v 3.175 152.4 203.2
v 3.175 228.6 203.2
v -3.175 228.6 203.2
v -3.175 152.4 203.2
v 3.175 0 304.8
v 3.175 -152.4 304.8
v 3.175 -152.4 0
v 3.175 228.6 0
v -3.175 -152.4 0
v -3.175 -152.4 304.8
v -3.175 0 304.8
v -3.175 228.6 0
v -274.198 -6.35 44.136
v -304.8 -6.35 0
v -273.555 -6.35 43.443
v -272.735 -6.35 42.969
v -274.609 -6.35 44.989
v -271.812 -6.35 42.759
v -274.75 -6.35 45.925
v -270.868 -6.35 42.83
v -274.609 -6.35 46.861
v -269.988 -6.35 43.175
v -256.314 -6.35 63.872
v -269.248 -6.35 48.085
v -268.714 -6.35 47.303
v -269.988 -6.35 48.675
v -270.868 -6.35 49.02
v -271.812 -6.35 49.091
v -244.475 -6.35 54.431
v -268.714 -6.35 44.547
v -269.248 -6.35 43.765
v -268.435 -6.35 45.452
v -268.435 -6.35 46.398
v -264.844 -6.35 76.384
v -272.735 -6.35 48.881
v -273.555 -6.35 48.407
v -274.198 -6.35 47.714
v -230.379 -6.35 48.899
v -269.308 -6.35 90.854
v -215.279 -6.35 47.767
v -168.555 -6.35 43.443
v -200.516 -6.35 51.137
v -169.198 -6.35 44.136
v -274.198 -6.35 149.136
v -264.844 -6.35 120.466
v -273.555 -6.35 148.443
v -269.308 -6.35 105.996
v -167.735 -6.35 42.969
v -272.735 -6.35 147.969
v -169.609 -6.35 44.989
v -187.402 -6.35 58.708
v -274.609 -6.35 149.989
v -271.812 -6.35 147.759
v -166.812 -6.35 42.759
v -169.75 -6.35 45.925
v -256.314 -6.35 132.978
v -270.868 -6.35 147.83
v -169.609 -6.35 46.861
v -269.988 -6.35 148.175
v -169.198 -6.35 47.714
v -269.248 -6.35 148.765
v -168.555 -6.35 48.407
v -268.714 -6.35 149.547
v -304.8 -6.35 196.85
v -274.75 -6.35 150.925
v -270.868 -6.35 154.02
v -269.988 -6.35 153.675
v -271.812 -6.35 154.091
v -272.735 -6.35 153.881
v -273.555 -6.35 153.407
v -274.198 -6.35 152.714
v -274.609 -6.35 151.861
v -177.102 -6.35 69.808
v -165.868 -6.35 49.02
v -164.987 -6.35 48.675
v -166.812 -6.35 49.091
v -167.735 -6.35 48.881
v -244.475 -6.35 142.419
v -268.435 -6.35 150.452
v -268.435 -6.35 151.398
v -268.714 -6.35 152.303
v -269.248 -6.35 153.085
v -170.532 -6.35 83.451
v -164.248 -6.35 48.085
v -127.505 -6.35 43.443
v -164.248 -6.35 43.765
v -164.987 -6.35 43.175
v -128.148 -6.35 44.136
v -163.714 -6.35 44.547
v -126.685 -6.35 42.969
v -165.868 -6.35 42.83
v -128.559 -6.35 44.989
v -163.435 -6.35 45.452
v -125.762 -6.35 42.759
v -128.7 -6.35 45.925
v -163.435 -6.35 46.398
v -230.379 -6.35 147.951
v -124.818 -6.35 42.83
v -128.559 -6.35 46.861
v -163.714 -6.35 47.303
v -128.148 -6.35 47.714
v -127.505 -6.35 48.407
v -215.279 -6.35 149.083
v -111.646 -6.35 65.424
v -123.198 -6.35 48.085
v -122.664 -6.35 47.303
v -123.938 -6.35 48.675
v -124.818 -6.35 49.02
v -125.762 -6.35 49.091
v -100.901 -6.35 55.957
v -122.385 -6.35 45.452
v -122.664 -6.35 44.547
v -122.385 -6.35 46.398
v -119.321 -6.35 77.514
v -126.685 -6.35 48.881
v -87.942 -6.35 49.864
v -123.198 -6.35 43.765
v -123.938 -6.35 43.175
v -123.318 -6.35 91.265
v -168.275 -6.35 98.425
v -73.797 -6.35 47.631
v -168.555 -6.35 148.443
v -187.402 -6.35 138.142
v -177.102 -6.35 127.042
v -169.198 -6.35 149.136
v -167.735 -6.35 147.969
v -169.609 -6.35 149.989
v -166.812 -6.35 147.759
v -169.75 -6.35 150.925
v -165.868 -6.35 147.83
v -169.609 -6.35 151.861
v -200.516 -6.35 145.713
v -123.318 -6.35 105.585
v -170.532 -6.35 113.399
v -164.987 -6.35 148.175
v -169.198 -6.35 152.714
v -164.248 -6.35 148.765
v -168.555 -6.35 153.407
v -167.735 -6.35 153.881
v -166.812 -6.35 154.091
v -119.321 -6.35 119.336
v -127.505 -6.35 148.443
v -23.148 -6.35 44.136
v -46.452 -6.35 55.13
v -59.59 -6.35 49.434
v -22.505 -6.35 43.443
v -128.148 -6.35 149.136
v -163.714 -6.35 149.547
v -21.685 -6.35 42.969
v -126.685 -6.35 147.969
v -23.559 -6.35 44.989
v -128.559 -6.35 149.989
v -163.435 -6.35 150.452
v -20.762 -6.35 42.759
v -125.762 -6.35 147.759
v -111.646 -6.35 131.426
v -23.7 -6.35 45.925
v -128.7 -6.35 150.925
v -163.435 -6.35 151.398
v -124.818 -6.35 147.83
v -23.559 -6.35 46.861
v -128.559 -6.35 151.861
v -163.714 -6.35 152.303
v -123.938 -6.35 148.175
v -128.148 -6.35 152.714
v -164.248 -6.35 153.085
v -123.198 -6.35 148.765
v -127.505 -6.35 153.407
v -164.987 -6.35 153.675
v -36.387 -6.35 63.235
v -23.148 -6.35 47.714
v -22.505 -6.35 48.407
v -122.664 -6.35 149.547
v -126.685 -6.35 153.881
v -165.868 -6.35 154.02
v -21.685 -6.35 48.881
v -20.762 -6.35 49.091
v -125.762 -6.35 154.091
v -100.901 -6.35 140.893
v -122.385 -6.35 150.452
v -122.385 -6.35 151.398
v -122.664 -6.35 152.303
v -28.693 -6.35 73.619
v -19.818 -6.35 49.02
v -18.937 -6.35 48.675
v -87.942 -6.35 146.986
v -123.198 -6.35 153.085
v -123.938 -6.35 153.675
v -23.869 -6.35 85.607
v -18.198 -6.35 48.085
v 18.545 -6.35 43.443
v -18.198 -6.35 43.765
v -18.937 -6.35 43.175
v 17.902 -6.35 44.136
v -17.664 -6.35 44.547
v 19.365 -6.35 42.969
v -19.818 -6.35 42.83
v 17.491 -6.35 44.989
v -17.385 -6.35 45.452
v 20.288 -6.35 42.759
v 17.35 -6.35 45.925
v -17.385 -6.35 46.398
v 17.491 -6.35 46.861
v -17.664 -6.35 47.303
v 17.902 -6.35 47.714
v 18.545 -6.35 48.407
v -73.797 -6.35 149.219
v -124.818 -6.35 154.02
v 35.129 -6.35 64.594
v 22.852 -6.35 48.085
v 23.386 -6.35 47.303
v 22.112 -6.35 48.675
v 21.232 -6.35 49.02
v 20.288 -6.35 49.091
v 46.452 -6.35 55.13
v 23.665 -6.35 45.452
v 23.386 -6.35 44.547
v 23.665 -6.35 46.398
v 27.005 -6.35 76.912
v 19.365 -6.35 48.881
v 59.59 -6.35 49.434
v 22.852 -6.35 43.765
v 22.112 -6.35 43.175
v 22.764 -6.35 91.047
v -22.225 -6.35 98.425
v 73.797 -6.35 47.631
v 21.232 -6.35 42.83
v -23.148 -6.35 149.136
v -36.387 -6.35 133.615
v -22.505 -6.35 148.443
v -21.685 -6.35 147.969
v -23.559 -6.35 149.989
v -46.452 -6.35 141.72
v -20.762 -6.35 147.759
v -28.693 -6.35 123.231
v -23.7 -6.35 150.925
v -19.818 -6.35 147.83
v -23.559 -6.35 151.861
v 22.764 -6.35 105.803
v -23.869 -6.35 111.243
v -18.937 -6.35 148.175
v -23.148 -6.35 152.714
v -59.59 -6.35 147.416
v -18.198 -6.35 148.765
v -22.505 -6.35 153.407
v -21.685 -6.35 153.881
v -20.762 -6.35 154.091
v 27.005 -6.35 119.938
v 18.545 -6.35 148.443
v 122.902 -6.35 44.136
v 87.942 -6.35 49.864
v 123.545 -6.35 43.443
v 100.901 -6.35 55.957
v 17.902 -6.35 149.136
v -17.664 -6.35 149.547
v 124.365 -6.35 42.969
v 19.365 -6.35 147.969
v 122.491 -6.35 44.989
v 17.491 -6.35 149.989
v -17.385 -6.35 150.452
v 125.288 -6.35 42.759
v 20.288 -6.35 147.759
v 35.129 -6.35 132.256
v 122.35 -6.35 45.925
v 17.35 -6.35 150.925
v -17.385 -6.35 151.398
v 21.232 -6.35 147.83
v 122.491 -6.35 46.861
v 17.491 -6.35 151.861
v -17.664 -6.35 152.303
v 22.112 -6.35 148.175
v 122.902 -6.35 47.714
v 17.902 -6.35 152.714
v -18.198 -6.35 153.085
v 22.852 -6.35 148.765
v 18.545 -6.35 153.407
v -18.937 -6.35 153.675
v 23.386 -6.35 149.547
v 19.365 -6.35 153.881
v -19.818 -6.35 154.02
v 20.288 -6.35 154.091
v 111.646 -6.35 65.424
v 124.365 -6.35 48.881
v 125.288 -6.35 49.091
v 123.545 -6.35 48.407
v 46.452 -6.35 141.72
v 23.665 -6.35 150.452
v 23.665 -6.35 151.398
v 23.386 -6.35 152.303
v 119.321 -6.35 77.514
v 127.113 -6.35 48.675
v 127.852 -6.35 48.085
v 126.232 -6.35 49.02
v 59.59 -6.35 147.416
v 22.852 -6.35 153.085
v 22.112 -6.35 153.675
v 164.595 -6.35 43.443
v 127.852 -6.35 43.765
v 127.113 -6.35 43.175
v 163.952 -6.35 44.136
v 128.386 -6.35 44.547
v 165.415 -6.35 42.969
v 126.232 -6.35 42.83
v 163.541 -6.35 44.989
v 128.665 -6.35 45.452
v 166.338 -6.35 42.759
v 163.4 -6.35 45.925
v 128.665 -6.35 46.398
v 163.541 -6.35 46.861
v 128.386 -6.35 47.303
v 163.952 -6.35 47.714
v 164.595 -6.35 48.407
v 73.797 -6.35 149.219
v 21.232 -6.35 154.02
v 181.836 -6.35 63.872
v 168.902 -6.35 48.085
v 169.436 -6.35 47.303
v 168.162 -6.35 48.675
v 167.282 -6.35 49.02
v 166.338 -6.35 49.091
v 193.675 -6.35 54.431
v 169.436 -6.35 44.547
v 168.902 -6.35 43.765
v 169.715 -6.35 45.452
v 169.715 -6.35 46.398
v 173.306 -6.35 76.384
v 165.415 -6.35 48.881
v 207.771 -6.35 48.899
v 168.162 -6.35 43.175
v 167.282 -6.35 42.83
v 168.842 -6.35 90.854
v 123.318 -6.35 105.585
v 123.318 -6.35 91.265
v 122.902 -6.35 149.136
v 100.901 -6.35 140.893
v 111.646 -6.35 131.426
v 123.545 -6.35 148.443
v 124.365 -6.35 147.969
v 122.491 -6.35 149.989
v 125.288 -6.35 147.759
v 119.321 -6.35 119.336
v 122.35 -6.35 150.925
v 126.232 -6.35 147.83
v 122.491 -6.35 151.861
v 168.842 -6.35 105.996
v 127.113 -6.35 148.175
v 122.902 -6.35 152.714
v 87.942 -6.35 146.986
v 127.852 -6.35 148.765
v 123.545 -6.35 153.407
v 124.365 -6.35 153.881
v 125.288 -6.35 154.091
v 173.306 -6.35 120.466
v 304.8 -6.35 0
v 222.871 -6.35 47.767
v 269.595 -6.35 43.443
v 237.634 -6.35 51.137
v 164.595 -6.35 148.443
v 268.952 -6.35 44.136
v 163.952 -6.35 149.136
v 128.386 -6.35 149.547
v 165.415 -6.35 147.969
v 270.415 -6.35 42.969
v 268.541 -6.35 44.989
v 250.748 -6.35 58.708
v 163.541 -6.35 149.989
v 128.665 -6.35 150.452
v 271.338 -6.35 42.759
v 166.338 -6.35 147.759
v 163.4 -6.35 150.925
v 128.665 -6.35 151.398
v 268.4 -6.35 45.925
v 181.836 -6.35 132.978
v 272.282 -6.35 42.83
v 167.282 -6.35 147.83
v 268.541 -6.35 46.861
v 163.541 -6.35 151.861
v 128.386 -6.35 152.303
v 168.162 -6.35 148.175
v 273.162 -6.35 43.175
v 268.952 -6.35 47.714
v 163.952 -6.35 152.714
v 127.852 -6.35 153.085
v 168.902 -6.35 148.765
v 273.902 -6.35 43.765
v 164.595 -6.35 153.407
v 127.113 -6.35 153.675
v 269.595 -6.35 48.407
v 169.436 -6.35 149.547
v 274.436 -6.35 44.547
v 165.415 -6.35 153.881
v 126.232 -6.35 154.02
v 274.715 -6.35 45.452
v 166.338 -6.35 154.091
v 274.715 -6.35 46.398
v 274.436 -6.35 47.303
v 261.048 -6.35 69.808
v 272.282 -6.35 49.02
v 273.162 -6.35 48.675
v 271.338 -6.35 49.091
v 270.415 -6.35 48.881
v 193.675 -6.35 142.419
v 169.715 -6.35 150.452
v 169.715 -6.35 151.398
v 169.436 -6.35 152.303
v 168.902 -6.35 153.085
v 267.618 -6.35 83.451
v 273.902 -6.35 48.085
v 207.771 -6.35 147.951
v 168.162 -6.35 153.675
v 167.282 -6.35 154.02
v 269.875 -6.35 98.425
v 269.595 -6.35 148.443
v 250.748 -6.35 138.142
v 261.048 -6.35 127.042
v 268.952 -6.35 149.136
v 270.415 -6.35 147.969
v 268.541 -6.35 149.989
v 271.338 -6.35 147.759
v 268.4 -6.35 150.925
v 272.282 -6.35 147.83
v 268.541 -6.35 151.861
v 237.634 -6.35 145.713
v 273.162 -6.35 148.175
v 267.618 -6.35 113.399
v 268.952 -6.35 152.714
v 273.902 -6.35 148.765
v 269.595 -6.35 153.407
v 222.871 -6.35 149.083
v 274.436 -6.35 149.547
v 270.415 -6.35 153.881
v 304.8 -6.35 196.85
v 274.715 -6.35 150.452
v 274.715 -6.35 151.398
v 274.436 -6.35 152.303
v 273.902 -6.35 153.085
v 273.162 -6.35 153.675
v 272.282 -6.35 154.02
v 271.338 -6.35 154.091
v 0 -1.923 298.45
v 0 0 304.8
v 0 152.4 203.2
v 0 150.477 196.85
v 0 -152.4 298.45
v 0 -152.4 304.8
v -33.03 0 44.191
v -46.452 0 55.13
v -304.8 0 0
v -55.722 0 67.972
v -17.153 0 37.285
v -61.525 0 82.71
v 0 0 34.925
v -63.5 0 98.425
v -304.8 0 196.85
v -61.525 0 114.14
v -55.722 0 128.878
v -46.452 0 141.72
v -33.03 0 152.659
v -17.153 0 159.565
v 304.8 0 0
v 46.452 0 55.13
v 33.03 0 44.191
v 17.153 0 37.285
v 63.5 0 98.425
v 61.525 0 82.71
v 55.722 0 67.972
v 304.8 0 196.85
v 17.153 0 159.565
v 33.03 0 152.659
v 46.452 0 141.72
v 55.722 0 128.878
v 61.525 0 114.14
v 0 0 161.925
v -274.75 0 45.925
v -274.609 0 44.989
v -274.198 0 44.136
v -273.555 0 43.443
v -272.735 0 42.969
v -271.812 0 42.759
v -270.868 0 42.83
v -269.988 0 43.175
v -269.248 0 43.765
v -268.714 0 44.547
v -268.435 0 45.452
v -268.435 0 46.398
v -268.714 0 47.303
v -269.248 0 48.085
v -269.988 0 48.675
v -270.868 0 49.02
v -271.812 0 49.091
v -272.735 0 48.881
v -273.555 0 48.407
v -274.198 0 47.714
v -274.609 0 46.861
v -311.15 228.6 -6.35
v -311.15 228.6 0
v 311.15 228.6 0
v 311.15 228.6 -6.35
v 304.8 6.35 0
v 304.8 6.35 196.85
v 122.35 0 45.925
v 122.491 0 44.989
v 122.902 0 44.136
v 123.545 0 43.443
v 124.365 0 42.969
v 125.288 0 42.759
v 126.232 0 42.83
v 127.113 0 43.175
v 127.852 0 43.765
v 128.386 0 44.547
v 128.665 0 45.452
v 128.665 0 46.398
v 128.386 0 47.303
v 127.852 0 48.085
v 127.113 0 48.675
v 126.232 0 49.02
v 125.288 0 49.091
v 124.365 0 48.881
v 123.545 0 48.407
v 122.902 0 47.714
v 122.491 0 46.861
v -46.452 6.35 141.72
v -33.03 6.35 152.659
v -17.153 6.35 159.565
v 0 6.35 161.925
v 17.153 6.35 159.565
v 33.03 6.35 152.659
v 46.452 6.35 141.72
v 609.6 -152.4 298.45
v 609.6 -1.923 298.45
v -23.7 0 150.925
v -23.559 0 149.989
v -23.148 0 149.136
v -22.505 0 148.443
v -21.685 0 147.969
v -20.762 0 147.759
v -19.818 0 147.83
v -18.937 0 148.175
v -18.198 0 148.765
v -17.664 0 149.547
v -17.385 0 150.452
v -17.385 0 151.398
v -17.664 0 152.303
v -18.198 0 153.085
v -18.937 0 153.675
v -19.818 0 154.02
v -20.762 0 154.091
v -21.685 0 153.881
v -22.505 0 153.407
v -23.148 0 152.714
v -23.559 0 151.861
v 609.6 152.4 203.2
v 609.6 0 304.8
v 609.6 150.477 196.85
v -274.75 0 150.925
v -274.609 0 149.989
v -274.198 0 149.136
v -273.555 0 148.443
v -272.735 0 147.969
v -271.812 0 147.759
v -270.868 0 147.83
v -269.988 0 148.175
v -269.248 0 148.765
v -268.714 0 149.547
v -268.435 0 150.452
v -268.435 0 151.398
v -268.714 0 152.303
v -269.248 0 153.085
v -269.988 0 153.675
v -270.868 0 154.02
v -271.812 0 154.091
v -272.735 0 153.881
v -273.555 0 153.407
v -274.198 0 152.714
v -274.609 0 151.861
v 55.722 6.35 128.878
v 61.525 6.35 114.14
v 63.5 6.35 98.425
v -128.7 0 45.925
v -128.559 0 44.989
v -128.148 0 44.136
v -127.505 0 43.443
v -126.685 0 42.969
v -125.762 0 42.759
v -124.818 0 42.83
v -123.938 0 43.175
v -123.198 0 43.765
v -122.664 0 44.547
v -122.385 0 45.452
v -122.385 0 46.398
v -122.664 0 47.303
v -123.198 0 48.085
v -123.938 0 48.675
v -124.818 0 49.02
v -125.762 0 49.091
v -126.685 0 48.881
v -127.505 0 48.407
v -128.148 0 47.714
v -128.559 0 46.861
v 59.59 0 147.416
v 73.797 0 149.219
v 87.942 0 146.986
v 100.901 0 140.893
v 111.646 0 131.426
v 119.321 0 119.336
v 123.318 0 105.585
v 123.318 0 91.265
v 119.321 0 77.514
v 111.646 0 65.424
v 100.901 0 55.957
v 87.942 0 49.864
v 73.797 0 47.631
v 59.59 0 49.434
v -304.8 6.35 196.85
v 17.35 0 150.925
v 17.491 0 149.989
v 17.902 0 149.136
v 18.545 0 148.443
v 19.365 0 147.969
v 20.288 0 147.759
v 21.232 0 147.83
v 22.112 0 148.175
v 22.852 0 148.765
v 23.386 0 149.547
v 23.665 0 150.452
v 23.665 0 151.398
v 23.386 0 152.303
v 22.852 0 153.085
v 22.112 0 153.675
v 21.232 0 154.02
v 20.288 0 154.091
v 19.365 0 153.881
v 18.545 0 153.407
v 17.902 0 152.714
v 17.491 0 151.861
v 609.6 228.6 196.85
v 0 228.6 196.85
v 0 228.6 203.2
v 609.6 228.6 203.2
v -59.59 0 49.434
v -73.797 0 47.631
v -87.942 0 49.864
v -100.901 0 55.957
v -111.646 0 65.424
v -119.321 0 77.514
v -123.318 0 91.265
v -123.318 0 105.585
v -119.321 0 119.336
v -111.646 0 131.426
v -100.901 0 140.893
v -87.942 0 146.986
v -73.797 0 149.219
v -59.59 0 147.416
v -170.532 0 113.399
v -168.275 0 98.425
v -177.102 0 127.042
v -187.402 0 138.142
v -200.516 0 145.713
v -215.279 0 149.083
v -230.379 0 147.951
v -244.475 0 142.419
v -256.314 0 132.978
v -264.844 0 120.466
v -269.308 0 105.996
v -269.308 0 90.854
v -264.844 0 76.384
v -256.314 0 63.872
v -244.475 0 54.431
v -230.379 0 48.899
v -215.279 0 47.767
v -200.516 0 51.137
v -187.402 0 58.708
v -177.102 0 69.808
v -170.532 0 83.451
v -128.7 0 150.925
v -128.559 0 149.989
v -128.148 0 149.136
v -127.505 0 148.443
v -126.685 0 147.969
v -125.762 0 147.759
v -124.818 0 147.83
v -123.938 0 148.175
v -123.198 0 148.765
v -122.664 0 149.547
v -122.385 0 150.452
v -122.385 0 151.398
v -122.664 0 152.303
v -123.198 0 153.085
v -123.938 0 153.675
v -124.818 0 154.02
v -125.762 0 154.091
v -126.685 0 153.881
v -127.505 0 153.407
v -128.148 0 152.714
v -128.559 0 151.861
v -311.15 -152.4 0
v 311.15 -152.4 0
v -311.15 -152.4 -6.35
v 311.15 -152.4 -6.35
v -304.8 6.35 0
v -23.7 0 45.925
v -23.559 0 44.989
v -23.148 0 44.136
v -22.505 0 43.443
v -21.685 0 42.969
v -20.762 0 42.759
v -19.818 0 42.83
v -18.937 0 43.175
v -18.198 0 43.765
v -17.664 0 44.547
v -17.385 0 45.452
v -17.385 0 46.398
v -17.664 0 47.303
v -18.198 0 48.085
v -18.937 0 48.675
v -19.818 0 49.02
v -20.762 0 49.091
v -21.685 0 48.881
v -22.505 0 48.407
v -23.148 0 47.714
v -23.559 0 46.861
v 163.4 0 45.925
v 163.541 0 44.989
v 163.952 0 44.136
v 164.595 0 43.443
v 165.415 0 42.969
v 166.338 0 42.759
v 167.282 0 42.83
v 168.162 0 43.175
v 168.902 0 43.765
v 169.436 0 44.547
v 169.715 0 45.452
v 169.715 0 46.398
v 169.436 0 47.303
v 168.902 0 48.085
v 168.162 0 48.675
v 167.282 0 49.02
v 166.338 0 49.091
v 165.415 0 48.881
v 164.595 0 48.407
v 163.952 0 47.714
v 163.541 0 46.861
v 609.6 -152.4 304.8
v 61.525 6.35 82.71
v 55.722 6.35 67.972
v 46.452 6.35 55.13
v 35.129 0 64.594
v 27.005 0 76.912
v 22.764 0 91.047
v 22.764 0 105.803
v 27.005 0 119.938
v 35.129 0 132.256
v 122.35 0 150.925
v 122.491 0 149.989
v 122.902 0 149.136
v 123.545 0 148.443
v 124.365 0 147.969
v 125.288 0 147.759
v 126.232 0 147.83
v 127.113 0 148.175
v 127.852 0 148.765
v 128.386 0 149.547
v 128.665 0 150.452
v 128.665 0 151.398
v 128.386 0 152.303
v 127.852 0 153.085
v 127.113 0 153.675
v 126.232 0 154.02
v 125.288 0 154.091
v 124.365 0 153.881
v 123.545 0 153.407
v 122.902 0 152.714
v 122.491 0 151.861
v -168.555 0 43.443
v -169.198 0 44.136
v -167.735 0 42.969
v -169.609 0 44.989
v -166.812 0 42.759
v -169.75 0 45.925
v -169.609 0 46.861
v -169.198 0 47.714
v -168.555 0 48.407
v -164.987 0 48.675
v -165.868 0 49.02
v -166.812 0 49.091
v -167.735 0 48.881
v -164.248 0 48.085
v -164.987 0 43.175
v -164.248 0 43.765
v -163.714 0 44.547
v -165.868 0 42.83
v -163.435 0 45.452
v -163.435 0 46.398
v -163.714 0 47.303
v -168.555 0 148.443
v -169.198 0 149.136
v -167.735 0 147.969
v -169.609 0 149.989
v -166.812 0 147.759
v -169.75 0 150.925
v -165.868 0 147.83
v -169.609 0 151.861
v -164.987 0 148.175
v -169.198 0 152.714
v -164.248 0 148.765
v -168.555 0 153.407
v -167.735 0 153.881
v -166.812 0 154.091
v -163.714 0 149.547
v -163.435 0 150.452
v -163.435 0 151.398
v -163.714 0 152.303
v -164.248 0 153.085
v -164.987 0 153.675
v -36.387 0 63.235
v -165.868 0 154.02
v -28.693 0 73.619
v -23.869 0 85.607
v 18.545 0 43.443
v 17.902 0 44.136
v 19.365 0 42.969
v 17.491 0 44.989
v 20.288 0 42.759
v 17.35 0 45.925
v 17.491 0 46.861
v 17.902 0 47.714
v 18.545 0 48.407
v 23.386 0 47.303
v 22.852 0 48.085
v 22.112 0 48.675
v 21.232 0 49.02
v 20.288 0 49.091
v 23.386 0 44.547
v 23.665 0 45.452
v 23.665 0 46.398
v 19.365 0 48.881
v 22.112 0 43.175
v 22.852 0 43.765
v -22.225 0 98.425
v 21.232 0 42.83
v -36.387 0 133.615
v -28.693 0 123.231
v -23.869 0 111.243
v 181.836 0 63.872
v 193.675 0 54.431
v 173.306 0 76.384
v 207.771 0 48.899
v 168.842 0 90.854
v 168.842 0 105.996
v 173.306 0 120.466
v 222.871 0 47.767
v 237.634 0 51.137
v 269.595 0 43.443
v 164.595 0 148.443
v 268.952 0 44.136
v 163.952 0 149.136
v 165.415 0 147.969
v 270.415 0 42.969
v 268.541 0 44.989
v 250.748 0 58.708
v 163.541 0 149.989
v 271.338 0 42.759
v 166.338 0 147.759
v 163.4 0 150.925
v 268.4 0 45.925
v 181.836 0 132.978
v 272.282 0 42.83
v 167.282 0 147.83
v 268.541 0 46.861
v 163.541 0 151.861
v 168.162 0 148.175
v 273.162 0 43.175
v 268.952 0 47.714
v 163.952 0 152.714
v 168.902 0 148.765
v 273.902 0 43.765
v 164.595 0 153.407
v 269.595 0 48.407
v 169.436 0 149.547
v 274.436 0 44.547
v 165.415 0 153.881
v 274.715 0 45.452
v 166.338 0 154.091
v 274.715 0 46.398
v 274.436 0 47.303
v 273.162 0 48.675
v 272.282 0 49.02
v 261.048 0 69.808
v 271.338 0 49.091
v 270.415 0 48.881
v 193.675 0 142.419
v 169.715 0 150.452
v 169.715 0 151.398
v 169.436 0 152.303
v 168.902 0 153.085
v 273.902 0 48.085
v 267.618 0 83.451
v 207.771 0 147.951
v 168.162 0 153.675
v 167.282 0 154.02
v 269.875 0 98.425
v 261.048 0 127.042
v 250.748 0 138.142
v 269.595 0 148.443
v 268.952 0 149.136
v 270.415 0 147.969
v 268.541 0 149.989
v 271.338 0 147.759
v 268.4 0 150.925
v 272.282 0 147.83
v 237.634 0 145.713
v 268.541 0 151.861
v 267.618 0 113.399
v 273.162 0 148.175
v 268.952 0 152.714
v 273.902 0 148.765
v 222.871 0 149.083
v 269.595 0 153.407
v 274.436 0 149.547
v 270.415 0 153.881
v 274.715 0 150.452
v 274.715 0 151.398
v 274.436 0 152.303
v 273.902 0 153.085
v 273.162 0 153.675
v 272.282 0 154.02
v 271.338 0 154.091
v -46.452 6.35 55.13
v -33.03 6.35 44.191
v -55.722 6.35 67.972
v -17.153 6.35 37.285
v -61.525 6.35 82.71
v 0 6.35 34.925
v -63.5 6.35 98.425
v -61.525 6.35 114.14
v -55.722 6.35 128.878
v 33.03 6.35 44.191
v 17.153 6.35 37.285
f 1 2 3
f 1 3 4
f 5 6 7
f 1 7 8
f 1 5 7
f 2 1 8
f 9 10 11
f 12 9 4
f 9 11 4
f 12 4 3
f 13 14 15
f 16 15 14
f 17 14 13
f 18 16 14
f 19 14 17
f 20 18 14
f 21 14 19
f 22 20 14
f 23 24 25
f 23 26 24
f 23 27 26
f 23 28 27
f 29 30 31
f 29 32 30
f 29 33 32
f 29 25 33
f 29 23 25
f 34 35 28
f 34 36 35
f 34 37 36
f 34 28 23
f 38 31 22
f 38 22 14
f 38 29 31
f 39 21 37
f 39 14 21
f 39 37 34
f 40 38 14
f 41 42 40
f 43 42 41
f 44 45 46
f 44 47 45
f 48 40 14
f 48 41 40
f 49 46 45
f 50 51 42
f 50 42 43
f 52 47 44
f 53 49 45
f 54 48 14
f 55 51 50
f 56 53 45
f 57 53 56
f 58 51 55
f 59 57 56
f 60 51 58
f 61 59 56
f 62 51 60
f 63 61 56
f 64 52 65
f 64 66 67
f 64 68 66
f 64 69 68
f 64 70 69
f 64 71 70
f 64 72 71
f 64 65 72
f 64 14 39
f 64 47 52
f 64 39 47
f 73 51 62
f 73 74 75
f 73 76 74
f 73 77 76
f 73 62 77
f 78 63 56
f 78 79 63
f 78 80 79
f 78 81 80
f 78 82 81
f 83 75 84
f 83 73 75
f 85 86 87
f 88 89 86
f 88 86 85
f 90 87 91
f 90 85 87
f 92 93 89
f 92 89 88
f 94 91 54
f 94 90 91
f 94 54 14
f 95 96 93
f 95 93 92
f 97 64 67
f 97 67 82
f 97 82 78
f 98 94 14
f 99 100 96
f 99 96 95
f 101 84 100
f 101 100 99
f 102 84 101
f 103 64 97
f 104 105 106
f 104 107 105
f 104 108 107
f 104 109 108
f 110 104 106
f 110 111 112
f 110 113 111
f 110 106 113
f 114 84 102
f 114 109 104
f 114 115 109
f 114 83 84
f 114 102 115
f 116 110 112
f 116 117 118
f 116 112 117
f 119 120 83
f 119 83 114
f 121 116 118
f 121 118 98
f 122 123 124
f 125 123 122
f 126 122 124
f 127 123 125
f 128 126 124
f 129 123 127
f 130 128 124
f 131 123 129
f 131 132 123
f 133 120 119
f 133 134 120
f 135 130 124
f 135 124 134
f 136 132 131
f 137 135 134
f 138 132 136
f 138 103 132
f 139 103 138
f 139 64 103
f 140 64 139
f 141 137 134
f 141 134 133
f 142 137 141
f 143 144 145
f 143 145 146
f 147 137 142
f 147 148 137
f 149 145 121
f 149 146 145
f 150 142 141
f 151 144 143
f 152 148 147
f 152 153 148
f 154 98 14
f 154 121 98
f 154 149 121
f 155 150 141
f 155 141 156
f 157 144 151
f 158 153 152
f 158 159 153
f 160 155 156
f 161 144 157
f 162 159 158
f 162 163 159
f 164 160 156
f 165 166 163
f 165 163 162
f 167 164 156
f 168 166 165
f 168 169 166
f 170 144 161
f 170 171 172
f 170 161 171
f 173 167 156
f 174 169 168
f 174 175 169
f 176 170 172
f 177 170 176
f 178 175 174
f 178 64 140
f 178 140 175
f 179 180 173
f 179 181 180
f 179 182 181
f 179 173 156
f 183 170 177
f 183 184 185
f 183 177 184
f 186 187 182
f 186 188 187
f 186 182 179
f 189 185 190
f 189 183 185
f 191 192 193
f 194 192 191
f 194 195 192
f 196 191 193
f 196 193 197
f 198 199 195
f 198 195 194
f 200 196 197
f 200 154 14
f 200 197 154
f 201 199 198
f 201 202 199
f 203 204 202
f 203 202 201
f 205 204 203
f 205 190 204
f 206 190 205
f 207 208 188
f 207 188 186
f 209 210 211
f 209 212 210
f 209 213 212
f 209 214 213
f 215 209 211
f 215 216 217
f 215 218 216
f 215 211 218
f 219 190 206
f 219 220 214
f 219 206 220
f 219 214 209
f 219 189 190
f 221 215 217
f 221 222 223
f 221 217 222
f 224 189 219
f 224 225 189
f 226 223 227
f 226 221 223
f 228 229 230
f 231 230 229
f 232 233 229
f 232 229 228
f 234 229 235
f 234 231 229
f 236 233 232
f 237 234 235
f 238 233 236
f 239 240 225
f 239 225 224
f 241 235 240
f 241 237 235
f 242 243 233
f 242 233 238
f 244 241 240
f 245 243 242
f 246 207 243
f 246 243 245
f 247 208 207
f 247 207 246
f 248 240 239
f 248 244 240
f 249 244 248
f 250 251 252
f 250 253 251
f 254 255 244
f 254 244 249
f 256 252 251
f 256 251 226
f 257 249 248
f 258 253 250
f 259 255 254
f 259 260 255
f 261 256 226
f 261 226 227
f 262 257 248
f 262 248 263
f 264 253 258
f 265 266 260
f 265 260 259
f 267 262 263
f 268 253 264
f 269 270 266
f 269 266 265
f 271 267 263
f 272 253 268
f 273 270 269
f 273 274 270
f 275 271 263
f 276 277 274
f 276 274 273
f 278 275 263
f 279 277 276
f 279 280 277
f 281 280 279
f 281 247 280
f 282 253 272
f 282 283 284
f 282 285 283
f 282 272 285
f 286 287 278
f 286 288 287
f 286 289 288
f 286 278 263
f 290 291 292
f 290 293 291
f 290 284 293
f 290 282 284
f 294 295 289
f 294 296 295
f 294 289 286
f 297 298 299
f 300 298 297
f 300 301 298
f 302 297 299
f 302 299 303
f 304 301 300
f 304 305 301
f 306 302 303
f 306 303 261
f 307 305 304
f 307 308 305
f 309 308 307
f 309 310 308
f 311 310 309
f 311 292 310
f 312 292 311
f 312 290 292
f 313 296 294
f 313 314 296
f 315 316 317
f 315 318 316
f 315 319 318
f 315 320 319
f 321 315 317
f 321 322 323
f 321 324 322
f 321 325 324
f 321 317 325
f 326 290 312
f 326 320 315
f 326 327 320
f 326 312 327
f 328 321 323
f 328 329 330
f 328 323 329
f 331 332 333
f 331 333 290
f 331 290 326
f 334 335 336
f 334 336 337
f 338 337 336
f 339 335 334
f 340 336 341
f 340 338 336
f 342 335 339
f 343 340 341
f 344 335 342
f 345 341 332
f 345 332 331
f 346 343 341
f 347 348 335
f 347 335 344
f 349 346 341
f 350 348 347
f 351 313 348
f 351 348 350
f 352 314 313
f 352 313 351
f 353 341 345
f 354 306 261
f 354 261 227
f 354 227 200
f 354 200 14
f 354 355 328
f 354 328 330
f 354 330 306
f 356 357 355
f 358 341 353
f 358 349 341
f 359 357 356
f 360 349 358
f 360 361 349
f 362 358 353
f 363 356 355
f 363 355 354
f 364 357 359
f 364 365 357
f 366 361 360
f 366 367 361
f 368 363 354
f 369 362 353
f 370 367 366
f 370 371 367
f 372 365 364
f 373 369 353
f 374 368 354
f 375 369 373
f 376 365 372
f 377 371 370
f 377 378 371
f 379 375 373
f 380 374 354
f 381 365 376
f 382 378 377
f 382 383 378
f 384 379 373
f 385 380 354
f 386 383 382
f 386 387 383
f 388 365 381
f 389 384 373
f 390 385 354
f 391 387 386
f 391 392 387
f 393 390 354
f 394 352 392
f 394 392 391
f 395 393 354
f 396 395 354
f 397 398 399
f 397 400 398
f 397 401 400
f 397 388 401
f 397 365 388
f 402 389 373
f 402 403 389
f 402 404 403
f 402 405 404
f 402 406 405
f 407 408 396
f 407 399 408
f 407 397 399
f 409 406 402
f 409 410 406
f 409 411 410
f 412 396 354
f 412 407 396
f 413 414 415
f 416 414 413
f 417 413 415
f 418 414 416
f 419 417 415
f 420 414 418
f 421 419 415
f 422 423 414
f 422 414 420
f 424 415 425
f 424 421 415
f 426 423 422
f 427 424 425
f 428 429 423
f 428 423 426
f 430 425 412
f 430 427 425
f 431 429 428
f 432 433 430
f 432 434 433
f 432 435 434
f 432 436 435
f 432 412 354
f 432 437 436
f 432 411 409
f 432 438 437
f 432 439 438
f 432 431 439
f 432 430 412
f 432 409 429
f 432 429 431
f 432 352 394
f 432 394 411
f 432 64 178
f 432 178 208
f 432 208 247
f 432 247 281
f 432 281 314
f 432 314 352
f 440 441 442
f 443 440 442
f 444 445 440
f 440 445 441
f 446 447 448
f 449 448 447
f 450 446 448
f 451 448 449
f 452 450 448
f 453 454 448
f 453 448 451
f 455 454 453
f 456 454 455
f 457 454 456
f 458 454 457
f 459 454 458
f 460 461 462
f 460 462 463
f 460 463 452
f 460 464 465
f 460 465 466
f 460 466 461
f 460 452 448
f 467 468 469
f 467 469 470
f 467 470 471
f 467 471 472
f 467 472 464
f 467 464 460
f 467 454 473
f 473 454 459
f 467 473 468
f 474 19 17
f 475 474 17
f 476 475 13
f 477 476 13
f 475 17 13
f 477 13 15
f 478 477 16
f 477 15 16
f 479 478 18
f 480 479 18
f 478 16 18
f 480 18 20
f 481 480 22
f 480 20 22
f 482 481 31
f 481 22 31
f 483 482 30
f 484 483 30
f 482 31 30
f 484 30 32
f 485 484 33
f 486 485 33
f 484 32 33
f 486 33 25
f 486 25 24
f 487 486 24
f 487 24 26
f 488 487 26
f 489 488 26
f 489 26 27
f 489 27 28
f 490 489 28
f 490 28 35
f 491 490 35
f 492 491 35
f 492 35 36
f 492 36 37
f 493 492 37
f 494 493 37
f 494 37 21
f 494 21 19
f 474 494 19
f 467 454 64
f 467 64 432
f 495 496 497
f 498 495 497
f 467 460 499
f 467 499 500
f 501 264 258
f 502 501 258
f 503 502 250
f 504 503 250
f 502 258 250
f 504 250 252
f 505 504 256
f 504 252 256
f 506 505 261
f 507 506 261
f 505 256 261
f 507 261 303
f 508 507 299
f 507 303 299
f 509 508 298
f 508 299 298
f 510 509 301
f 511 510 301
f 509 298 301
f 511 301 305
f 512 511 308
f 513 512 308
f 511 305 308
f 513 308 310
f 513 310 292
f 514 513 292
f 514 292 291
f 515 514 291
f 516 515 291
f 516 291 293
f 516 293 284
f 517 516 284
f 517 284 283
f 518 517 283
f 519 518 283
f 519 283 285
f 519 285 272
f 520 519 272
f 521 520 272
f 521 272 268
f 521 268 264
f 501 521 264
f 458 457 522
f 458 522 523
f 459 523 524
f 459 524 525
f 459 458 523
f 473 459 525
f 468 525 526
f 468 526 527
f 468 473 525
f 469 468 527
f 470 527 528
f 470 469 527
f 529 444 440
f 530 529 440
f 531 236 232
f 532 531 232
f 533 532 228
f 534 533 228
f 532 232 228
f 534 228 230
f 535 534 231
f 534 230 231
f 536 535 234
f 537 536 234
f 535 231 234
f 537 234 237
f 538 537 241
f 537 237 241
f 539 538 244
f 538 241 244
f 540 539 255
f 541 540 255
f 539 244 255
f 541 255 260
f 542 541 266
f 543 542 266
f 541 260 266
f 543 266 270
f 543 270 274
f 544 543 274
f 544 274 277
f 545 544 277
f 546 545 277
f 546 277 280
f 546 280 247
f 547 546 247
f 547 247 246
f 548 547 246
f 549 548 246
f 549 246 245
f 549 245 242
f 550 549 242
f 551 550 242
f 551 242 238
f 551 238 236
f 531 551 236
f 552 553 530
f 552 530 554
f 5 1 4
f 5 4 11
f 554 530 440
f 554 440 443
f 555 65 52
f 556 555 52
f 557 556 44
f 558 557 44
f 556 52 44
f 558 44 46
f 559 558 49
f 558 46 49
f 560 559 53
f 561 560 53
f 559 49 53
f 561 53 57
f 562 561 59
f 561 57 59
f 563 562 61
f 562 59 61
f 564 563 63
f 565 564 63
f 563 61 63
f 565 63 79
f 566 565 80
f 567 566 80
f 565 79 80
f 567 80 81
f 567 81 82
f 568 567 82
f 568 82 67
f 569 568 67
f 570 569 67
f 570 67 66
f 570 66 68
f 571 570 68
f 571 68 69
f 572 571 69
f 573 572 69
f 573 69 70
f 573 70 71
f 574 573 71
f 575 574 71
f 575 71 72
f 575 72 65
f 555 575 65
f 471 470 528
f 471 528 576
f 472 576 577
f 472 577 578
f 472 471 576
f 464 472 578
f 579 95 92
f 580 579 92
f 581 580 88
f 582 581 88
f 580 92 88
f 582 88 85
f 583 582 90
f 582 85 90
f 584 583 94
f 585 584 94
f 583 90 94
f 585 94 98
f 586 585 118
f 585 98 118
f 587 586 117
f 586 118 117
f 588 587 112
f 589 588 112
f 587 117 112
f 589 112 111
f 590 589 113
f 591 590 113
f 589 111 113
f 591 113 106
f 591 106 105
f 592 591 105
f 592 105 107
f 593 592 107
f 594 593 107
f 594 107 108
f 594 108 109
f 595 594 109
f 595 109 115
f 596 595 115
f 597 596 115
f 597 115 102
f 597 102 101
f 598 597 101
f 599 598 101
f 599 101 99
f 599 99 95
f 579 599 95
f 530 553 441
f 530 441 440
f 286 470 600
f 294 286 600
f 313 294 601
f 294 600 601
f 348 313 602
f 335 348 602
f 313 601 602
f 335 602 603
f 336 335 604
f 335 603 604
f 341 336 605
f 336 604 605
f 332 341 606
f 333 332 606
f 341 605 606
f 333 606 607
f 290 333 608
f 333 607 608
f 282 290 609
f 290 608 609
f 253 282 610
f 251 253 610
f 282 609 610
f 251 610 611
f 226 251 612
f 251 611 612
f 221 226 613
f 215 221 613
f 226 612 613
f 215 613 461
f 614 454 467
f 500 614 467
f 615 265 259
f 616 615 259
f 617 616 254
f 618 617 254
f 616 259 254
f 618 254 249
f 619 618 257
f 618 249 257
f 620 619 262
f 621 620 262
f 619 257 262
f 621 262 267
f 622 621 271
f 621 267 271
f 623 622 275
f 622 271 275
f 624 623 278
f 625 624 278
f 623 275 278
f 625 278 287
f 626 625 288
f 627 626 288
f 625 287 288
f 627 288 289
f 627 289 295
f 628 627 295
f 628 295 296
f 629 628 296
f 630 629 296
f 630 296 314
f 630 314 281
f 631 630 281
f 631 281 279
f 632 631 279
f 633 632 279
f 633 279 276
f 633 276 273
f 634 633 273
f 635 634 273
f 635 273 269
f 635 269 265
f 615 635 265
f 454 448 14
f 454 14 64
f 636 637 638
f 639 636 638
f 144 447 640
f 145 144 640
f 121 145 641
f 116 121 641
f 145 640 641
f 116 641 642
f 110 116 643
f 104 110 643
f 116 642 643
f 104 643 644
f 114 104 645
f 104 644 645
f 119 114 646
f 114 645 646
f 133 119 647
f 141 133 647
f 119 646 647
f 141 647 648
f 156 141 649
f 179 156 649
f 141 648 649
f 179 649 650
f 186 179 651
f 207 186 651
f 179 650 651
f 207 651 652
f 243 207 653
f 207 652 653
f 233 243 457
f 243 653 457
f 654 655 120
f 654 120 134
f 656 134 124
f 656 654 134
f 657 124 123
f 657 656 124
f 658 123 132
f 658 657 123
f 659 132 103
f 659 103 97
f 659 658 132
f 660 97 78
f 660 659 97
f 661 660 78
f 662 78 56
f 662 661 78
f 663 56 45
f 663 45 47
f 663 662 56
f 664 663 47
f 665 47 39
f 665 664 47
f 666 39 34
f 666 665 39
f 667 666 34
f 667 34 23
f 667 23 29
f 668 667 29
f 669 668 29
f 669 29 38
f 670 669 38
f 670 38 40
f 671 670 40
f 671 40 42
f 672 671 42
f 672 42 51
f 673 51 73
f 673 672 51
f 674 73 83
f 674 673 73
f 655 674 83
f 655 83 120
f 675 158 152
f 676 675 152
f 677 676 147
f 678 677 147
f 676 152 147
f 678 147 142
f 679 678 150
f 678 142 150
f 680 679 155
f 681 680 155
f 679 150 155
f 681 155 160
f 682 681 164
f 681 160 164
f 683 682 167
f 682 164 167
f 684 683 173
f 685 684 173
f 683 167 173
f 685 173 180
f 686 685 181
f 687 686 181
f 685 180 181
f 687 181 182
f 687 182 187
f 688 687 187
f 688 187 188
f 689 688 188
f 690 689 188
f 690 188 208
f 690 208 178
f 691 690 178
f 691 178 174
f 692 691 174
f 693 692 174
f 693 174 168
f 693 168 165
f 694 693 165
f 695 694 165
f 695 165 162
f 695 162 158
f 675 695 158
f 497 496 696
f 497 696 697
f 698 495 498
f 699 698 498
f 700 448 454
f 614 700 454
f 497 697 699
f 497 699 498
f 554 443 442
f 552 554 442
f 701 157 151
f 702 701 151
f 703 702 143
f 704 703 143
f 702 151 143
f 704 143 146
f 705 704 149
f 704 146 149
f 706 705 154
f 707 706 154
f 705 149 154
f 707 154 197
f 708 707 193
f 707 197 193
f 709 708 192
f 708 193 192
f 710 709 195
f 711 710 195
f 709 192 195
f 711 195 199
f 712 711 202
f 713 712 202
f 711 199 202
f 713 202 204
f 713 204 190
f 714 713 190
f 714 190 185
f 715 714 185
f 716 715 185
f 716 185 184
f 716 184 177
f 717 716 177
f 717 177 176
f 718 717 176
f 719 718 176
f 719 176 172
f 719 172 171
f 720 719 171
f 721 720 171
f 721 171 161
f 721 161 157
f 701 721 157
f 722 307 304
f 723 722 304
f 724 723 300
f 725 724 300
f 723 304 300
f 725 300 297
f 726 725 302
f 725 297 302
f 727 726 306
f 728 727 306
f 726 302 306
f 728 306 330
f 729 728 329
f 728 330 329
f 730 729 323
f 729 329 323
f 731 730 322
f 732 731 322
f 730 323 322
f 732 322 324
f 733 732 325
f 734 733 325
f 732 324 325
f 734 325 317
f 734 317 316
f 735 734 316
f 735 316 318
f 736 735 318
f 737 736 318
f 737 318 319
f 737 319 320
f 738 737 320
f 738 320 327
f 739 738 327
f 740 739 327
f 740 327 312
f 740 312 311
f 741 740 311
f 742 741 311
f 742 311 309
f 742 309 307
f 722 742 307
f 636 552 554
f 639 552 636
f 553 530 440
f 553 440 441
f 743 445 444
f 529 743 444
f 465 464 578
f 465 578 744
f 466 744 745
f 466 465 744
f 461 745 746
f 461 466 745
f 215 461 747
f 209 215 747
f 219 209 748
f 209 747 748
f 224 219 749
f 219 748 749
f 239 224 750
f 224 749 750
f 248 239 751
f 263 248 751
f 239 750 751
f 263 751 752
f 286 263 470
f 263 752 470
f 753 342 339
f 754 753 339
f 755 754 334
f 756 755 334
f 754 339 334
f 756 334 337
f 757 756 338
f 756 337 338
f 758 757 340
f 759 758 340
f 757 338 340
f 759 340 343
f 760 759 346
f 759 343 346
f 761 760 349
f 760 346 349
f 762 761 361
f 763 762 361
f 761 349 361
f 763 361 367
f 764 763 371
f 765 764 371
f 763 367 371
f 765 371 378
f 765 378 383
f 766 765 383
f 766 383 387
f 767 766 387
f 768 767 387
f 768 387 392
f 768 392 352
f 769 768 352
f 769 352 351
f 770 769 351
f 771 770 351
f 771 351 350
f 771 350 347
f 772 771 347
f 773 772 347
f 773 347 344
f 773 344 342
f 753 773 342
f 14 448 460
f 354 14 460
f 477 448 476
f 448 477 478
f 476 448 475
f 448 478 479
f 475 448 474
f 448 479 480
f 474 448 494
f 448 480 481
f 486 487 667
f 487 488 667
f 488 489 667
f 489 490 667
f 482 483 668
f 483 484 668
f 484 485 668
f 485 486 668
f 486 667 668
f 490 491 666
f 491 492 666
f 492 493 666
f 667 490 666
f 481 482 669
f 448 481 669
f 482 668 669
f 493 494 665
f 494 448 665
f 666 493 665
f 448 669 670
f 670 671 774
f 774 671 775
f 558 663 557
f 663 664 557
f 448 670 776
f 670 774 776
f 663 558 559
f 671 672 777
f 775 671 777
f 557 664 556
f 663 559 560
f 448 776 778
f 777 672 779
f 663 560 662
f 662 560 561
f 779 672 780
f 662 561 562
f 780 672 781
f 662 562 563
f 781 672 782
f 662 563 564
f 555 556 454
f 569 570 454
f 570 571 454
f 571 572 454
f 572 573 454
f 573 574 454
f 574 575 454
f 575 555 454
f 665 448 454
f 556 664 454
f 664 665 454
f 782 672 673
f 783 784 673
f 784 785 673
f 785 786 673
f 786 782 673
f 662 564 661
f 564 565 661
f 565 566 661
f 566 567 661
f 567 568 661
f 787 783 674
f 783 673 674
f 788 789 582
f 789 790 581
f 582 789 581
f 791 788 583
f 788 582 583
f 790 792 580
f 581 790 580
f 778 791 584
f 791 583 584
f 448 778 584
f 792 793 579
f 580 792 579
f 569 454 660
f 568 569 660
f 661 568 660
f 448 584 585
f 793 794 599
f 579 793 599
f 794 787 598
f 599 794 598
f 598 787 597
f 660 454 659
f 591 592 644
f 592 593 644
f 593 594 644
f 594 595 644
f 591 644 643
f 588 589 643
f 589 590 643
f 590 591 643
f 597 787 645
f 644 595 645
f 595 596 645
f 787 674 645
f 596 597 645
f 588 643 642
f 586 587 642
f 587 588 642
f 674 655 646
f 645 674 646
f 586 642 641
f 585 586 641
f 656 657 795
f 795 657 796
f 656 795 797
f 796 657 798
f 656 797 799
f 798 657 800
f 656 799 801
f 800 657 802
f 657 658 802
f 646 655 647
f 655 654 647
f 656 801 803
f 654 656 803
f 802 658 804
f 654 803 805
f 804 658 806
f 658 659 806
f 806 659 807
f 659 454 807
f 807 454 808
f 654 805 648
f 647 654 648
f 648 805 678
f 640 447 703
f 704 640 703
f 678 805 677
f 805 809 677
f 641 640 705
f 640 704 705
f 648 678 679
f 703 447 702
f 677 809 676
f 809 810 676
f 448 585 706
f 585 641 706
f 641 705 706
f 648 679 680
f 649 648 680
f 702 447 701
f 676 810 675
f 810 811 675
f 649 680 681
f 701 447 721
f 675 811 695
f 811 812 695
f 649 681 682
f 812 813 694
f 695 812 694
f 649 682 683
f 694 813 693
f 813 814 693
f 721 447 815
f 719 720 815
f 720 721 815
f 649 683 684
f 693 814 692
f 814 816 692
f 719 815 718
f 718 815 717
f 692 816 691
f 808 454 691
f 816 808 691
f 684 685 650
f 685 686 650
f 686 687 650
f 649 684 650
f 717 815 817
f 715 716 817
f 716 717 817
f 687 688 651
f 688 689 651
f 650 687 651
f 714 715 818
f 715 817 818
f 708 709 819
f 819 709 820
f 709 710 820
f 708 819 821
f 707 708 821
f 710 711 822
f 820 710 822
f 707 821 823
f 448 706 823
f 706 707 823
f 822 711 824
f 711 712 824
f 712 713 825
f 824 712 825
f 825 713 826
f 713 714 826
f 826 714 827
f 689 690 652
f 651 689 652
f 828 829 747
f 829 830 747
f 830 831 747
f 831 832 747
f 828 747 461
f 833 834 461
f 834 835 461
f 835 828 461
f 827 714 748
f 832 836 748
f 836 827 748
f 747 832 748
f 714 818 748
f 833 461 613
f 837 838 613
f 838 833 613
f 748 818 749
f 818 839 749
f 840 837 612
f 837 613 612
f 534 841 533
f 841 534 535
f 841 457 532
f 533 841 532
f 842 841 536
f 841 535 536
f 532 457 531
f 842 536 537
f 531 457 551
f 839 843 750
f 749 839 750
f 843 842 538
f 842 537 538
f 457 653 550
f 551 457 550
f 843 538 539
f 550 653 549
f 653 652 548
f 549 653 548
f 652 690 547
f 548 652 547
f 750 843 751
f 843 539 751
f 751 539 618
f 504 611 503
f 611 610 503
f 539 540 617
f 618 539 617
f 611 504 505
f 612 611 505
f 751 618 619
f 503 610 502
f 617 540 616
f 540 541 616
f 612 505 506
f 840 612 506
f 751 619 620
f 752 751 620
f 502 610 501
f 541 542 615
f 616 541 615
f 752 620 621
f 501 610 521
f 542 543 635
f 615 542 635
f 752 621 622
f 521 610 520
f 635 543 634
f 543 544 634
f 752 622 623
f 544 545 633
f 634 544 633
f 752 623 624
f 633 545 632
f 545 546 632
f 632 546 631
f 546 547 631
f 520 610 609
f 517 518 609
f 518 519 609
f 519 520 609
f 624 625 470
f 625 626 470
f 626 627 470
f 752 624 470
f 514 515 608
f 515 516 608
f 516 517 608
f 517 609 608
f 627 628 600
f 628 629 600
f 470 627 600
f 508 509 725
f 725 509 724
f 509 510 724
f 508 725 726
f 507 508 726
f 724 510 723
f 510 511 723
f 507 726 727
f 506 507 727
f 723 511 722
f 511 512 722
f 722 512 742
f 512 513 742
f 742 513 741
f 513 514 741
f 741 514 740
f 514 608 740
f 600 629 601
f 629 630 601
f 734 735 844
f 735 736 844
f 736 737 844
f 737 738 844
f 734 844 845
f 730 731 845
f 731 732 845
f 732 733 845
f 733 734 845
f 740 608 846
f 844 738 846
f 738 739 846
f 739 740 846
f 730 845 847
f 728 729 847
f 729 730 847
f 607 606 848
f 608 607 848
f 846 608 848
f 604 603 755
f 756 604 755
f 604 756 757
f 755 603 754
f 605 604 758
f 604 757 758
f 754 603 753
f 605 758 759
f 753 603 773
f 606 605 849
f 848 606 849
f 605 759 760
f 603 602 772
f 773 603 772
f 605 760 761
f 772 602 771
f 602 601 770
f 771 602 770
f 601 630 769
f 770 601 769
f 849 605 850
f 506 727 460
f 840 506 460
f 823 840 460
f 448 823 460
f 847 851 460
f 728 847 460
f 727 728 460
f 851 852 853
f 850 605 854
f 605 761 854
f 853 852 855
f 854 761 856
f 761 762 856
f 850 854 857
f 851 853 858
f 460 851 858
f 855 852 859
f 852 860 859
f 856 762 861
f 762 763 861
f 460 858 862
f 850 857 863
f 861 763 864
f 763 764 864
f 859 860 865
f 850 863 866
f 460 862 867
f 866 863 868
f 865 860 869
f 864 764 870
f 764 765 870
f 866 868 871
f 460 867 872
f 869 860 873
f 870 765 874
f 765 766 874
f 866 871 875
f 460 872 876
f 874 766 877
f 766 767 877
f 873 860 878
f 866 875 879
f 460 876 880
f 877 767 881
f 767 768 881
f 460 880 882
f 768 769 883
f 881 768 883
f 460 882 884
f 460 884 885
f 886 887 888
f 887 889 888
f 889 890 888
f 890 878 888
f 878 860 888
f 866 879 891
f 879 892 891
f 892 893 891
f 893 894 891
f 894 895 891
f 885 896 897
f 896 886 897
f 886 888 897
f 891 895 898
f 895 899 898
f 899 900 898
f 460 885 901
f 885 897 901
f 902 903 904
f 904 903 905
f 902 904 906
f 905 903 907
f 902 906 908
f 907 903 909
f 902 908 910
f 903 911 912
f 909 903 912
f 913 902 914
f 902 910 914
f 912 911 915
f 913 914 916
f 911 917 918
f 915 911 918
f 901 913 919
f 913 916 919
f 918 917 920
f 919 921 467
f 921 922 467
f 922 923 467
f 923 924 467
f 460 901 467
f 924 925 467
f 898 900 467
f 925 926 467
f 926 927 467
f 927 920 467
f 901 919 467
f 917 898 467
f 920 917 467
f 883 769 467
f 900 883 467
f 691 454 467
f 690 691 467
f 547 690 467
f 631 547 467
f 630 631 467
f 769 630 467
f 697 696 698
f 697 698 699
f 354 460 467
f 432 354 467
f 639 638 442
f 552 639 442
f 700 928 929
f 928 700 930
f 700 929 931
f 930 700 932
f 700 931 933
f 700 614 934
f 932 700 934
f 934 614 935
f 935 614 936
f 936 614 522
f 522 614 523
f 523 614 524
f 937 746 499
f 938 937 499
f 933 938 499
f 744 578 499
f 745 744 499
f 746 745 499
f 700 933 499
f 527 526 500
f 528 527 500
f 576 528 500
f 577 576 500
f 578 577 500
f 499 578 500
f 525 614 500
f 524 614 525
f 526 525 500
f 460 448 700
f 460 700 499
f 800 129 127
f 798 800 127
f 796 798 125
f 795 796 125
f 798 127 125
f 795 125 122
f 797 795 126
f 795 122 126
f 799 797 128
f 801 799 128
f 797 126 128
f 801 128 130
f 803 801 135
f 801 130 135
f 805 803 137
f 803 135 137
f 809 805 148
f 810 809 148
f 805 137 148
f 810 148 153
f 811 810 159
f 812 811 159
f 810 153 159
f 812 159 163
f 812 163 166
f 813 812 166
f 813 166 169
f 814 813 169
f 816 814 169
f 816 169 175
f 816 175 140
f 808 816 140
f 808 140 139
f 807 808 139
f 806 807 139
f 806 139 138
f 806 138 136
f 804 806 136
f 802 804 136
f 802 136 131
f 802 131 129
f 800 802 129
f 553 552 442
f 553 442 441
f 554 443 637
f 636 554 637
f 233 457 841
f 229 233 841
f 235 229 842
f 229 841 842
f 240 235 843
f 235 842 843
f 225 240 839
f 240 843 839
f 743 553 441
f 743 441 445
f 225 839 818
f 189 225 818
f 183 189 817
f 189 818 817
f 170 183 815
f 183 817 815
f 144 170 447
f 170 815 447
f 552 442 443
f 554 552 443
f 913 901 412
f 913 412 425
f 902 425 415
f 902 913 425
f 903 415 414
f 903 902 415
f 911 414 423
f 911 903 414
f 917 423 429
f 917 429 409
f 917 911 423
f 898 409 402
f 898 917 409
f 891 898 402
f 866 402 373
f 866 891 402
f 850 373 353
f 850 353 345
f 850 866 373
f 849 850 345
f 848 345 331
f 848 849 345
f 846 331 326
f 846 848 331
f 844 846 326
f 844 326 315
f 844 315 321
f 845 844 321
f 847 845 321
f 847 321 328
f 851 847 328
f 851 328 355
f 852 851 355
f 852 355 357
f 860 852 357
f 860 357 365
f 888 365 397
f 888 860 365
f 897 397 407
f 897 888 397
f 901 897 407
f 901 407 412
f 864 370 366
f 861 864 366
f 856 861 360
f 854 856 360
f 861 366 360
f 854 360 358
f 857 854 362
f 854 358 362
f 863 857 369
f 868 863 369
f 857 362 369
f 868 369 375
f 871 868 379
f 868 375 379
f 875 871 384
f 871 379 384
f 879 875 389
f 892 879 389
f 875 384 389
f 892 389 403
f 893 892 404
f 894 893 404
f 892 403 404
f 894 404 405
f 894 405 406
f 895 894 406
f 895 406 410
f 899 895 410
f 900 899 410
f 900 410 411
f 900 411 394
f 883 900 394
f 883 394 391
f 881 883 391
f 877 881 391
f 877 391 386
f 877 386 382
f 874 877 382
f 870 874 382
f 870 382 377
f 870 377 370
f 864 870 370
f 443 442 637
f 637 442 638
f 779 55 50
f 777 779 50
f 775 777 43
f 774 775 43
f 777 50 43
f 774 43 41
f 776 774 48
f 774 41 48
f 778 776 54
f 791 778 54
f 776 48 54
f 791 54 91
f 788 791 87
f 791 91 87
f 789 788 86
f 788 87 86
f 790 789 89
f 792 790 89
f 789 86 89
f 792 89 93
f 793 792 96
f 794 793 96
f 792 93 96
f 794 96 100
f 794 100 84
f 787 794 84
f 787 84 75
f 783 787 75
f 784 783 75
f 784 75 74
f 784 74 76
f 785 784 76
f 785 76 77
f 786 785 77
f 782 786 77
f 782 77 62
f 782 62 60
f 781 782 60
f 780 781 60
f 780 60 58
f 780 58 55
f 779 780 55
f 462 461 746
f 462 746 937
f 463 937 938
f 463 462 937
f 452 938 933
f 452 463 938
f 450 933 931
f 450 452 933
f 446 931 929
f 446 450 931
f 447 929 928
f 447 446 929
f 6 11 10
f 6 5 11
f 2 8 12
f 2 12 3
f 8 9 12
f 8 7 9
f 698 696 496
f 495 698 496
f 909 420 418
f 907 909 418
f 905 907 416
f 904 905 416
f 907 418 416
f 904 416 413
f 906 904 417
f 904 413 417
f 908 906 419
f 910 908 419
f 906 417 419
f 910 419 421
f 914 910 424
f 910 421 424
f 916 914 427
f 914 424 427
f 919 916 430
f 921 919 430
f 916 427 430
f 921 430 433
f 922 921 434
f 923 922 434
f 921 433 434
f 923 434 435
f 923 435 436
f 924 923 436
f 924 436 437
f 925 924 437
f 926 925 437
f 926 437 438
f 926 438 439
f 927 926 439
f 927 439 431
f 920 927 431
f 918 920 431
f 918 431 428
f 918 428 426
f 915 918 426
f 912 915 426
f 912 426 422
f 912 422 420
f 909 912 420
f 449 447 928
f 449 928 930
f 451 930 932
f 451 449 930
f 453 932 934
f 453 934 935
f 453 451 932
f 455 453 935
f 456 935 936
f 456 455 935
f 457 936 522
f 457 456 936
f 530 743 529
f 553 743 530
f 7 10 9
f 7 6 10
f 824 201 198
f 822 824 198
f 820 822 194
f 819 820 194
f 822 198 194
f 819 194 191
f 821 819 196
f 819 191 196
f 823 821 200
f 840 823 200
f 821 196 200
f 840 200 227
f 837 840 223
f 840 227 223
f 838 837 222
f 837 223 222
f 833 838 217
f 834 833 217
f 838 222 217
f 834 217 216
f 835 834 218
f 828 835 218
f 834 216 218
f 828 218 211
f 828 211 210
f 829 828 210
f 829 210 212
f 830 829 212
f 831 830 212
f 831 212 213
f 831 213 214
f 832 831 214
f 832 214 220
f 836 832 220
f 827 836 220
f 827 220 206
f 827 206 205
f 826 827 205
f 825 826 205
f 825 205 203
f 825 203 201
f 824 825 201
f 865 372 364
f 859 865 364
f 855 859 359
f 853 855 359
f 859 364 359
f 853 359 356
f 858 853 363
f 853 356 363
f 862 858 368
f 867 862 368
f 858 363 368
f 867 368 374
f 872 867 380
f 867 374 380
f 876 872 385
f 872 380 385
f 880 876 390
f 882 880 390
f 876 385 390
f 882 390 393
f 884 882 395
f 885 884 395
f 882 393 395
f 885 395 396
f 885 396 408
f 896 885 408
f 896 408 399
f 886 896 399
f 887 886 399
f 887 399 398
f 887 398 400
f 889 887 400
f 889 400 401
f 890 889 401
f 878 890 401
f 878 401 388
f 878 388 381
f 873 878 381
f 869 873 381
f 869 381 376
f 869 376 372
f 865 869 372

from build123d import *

# Parameters (mm, degrees)
F1_DEPTH = 3.175
F2_W     = 622.3
F2_H     = 381
F3_DEPTH = 6.35
F4_W     = 609.6
F4_H     = 196.85
F4_R     = 50.8
F5_DEPTH = 6.35
F6_DEPTH = 609.6
F7_DEPTH = 609.6
F8_DEPTH = 609.6
F9_DEPTH = 6.35
F10_D    = 6.35


# Not quite as in the source:
# - a feature names something its author has since deleted; it is built from what else it names


with BuildPart() as f1:
    # F0 (on Right) → F1 (new body, symmetric)
    with BuildSketch(Plane.YZ):
        Polygon((-152.4, 298.45), (-152.4, 0), (228.6, 0), (228.6, 196.85), (150.4773747004, 196.85), (-1.9226252996, 298.45), align=None)
        Polygon((150.4773747004, 196.85), (228.6, 196.85), (228.6, 203.2), (152.4, 203.2), align=None)
        Polygon((0, 304.8), (-1.9226252996, 298.45), (150.4773747004, 196.85), (152.4, 203.2), align=None)
        Polygon((-152.4, 304.8), (-152.4, 298.45), (-1.9226252996, 298.45), (0, 304.8), align=None)
    extrude(amount=F1_DEPTH, both=True)


with BuildPart() as f3:
    # F2 (on Top) → F3 (new body)
    with BuildSketch(Plane.XY):
        with Locations((0, 38.1)):
            Rectangle(F2_W, F2_H)
    extrude(amount=-F3_DEPTH)


with BuildPart() as f5:
    # F4 (on Front) → F5 (new body)
    with BuildSketch(Plane.XZ):
        with Locations((0, 98.425)):
            Rectangle(F4_W, F4_H)
        with Locations((-219.075, 98.425)):
            Circle(F4_R, mode=Mode.SUBTRACT)
        with BuildLine():
            ThreePointArc((-46.4516304348, 55.1295495467), (-123.825, 98.425), (-46.4516304348, 141.7204504533))
            ThreePointArc((-46.4516304348, 141.7204504533), (0, 161.925), (46.4516304348, 141.7204504533))
            ThreePointArc((46.4516304348, 141.7204504533), (97.831378475, 142.756519114), (123.825, 98.425))
            ThreePointArc((123.825, 98.425), (97.831378475, 54.093480886), (46.4516304348, 55.1295495467))
            ThreePointArc((46.4516304348, 55.1295495467), (0, 34.925), (-46.4516304348, 55.1295495467))
        make_face(mode=Mode.SUBTRACT)
        with Locations((219.075, 98.425)):
            Circle(F4_R, mode=Mode.SUBTRACT)
        with Locations((-219.075, 98.425)):
            Circle(F4_R)
        with Locations((219.075, 98.425)):
            Circle(F4_R)
        with BuildLine():
            ThreePointArc((-46.4516304348, 55.1295495467), (-63.5, 98.425), (-46.4516304348, 141.7204504533))
            ThreePointArc((-46.4516304348, 141.7204504533), (-123.825, 98.425), (-46.4516304348, 55.1295495467))
        make_face()
        with BuildLine():
            ThreePointArc((123.825, 98.425), (97.831378475, 142.756519114), (46.4516304348, 141.7204504533))
            ThreePointArc((46.4516304348, 141.7204504533), (59.0843825922, 121.690548214), (63.5, 98.425))
            ThreePointArc((63.5, 98.425), (59.0843825922, 75.159451786), (46.4516304348, 55.1295495467))
            ThreePointArc((46.4516304348, 55.1295495467), (97.831378475, 54.093480886), (123.825, 98.425))
        make_face()
    extrude(amount=-F5_DEPTH)


with BuildPart() as f6:
    # F0 (on Right) → F6 (new body)
    with BuildSketch(Plane.YZ):
        Polygon((-152.4, 304.8), (-152.4, 298.45), (-1.9226252996, 298.45), (0, 304.8), align=None)
    extrude(amount=F6_DEPTH)


with BuildPart() as f7:
    # F0 (on Right) → F7 (new body)
    with BuildSketch(Plane.YZ):
        Polygon((0, 304.8), (-1.9226252996, 298.45), (150.4773747004, 196.85), (152.4, 203.2), align=None)
    extrude(amount=F7_DEPTH)


with BuildPart() as f8:
    # F0 (on Right) → F8 (new body)
    with BuildSketch(Plane.YZ):
        Polygon((150.4773747004, 196.85), (228.6, 196.85), (228.6, 203.2), (152.4, 203.2), align=None)
    extrude(amount=F8_DEPTH)


with BuildPart() as f9:
    # F4 (on Front) → F9 (new body)
    with BuildSketch(Plane.XZ):
        with Locations((0, 98.425)):
            Rectangle(F4_W, F4_H)
        with Locations((-219.075, 98.425)):
            Circle(F4_R, mode=Mode.SUBTRACT)
        with BuildLine():
            ThreePointArc((-46.4516304348, 55.1295495467), (-123.825, 98.425), (-46.4516304348, 141.7204504533))
            ThreePointArc((-46.4516304348, 141.7204504533), (0, 161.925), (46.4516304348, 141.7204504533))
            ThreePointArc((46.4516304348, 141.7204504533), (97.831378475, 142.756519114), (123.825, 98.425))
            ThreePointArc((123.825, 98.425), (97.831378475, 54.093480886), (46.4516304348, 55.1295495467))
            ThreePointArc((46.4516304348, 55.1295495467), (0, 34.925), (-46.4516304348, 55.1295495467))
        make_face(mode=Mode.SUBTRACT)
        with Locations((219.075, 98.425)):
            Circle(F4_R, mode=Mode.SUBTRACT)
        with BuildLine():
            ThreePointArc((-46.4516304348, 141.7204504533), (-28.693480886, 123.231378475), (-22.225, 98.425))
            ThreePointArc((-22.225, 98.425), (-28.693480886, 73.618621525), (-46.4516304348, 55.1295495467))
            ThreePointArc((-46.4516304348, 55.1295495467), (0, 34.925), (46.4516304348, 55.1295495467))
            ThreePointArc((46.4516304348, 55.1295495467), (22.225, 98.425), (46.4516304348, 141.7204504533))
            ThreePointArc((46.4516304348, 141.7204504533), (0, 161.925), (-46.4516304348, 141.7204504533))
        make_face()
    extrude(amount=F9_DEPTH)

    # F10 (through all)
    with Locations(Plane(origin=(0, 0, 0), x_dir=(1, 0, 0), z_dir=(0, 1, 0))):
        with Locations((-271.575, -150.925), (-166.575, -150.925), (-125.525, -150.925), (-125.525, -45.925), (-166.575, -45.925), (-271.575, -45.925), (-20.525, -150.925), (20.525, -150.925), (-20.525, -45.925), (20.525, -45.925), (125.525, -150.925), (166.575, -150.925), (271.575, -150.925), (271.575, -45.925), (166.575, -45.925), (125.525, -45.925)):
            Hole(F10_D / 2)


solid = Compound([f1.part, f3.part, f5.part, f6.part, f7.part, f8.part, f9.part])
